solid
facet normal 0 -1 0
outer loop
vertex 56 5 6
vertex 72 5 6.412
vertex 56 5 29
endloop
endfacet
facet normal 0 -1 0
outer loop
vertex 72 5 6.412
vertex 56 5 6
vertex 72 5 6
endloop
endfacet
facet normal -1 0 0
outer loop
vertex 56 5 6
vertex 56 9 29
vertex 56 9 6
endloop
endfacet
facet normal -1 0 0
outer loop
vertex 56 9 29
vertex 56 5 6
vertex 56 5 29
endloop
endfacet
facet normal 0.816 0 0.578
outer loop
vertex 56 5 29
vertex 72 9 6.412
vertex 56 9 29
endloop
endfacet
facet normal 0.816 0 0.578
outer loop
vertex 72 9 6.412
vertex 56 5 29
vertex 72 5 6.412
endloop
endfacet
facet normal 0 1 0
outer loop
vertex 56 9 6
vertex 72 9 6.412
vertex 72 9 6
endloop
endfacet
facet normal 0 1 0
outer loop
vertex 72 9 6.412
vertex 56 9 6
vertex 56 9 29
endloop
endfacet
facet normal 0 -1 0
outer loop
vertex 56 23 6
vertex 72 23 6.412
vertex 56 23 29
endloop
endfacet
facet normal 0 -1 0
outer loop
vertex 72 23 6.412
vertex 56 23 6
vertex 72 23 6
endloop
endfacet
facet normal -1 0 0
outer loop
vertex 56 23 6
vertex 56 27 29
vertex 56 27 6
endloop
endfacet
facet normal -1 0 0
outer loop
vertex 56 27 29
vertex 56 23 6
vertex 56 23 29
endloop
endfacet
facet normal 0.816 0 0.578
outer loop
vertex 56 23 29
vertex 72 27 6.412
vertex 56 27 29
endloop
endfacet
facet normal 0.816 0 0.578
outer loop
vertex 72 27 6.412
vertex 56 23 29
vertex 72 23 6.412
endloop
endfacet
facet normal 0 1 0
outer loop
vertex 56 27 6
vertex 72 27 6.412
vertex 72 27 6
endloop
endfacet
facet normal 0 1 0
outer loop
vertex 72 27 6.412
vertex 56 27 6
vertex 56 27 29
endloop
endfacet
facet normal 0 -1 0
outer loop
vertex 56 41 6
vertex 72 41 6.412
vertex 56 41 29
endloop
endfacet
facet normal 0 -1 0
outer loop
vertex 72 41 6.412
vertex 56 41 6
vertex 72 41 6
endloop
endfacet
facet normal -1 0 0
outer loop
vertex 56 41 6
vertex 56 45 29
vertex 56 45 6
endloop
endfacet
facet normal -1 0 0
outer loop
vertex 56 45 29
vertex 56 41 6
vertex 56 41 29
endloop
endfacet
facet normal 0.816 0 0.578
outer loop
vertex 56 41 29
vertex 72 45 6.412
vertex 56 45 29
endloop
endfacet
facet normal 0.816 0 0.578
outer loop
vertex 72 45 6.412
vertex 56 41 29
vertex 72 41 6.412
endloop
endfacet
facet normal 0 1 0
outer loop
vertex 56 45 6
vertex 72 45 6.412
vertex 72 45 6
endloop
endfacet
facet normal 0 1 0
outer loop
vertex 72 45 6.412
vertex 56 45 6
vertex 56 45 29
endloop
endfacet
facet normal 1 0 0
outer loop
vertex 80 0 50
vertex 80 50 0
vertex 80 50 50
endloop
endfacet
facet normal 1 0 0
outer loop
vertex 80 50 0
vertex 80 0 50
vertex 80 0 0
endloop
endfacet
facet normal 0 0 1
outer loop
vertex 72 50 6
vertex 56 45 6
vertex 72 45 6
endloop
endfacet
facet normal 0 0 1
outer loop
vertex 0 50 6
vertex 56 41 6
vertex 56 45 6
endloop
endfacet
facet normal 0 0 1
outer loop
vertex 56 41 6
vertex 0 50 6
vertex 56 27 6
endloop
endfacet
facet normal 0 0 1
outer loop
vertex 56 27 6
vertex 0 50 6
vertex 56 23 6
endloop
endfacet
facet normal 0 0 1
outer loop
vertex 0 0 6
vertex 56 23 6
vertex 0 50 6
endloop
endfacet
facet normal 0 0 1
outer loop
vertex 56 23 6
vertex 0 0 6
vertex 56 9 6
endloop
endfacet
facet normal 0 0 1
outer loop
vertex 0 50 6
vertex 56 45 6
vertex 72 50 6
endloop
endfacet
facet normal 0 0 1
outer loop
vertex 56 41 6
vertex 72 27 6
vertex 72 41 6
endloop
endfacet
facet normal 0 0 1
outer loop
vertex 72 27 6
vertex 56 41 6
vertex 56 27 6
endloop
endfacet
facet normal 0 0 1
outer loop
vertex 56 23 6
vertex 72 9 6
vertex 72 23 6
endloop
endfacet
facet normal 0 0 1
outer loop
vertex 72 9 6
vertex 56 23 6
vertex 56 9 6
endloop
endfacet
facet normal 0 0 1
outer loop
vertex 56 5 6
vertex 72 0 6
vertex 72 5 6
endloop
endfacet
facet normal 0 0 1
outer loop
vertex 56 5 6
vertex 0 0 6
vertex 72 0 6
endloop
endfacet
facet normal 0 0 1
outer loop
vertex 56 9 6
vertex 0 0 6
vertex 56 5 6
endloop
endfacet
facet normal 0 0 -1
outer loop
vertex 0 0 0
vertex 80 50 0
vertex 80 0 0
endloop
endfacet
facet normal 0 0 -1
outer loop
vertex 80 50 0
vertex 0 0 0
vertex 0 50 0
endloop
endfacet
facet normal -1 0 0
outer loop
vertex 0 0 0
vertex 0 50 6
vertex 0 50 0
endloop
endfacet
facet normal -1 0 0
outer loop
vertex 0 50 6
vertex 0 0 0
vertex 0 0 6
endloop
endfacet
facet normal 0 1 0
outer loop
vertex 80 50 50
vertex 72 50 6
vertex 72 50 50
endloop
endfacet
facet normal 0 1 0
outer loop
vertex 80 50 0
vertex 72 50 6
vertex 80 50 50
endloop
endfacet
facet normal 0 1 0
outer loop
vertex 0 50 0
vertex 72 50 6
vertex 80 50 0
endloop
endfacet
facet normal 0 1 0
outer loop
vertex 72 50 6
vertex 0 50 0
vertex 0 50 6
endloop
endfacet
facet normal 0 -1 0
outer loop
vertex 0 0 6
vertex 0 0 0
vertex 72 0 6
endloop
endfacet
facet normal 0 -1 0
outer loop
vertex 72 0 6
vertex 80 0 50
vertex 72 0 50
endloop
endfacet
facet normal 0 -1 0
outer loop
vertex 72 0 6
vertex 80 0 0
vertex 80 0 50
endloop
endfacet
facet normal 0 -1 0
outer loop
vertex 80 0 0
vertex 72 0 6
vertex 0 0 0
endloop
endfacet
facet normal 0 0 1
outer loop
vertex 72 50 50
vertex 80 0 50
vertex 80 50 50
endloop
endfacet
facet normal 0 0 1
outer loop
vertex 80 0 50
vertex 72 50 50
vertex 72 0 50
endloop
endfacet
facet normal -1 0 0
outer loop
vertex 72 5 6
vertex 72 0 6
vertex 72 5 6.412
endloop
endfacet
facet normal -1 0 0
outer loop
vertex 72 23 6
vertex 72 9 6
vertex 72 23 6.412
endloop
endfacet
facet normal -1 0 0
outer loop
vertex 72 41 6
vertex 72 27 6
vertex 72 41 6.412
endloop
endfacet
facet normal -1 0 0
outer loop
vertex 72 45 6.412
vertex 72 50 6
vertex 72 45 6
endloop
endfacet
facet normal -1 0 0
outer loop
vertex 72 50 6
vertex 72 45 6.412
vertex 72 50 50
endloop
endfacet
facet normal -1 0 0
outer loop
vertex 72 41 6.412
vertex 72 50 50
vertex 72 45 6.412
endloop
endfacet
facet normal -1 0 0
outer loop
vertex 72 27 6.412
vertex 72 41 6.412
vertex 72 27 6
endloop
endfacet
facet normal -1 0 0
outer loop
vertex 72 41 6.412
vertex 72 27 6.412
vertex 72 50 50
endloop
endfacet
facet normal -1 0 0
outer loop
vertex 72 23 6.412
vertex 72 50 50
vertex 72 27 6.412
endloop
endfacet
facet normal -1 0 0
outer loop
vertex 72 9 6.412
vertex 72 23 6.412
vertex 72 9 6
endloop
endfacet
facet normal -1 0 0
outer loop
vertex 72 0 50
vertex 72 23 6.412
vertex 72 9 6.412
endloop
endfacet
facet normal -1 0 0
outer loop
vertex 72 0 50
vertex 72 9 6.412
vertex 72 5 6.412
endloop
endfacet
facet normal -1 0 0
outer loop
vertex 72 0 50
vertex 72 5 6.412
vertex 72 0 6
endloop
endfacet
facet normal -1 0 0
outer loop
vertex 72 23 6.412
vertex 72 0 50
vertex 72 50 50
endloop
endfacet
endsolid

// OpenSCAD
$fn = 32;

// ----------------------------------------------------------------------
// Rib bracket: 3-gusset L bracket
// ----------------------------------------------------------------------

// --- parameters (mm) ---
base_l = 80;              // foot length, X
base_w = 50;              // foot width, Y
base_t = 6;               // foot thickness
plate_t = 8;              // upright plate thickness
plate_h = 50;             // overall height
gus_l = 16;               // gusset leg along the foot
gus_h = 24;               // gusset height
gus_t = 4;                // gusset thickness
gus_edge = 5;             // gusset margin from the foot edge
n_gus = 3;                // gusset count

gus_pitch = (base_w - 2 * gus_edge - gus_t) / (n_gus - 1);  // gusset pitch

union() {
  cube([base_l, base_w, base_t]);
  translate([base_l - plate_t, 0, base_t - 1])
    cube([plate_t, base_w, plate_h - base_t + 1]);
  for (i = [0 : n_gus - 1])
    translate([base_l - plate_t - gus_l, gus_edge + i * gus_pitch, base_t - 1])
      rotate([-90, 0, 0])
        linear_extrude(height = gus_t)
          polygon(points = [[0, 0], [gus_l + 1, 0], [0, -gus_h]]);
}
